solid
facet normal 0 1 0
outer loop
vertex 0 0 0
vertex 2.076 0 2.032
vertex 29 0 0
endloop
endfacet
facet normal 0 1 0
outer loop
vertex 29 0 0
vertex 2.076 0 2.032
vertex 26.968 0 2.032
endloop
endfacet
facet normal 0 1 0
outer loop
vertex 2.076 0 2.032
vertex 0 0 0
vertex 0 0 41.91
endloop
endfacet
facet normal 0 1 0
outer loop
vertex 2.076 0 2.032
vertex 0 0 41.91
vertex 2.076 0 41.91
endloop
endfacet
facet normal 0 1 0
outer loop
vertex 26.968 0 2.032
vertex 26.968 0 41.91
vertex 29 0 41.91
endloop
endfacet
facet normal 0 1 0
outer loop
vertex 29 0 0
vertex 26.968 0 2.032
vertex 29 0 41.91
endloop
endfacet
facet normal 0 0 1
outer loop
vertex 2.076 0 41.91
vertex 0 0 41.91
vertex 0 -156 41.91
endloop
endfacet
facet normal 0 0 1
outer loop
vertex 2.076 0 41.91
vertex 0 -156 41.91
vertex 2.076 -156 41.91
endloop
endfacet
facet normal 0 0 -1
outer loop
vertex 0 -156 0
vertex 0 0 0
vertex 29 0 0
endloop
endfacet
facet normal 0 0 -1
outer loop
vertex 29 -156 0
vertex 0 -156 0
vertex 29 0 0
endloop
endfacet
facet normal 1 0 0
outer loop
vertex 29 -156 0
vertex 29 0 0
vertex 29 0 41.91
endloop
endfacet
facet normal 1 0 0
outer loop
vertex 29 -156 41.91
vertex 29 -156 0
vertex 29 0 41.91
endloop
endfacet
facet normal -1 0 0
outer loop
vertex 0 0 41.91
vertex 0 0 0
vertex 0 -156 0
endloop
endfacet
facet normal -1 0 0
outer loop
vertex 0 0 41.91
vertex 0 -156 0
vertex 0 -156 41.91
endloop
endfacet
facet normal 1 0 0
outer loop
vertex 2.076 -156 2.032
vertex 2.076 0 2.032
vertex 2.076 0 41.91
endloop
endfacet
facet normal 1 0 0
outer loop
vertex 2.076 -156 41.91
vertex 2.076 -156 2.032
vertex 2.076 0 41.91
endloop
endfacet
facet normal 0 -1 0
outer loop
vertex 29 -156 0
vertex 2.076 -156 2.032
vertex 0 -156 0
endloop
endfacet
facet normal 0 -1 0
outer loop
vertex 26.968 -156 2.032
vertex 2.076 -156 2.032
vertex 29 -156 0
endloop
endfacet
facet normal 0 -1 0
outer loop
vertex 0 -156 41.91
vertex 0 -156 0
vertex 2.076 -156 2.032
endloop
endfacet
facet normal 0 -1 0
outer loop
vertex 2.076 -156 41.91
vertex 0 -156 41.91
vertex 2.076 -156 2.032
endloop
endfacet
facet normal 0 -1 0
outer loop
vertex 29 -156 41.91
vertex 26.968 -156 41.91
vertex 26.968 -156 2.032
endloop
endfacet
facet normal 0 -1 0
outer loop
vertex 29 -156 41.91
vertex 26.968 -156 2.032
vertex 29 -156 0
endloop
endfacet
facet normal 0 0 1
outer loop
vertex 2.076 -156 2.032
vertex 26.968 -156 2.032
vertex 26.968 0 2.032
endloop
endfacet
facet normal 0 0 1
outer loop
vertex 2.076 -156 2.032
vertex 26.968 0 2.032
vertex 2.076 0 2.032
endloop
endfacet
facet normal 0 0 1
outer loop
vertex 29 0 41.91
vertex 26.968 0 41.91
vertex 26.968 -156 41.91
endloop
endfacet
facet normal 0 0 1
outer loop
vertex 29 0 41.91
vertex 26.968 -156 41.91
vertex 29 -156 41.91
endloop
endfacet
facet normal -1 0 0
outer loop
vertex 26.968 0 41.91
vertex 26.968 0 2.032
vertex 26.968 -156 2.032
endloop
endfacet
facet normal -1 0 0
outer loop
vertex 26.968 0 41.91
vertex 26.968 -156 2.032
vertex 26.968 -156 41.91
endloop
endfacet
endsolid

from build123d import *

# Parameters (mm, degrees)
F0_W     = 28.999942
F0_H     = 41.91
F1_DEPTH = 155.999942
F2_W     = 24.892
F2_H     = 39.878
F3_DEPTH = 156.000942


with BuildPart() as f1:
    # F0 (on Front) → F1 (new body)
    with BuildSketch(Plane.XZ):
        with Locations((14.499971, 20.955)):
            Rectangle(F0_W, F0_H)
    extrude(amount=F1_DEPTH)

    # F2 (on face) → F3 (cut, through all)
    with BuildSketch(Plane(origin=(0, 0, 0), x_dir=(-1, 0, 0), z_dir=(0, 1, 0))):
        with Locations((-14.521942, 21.971)):
            Rectangle(F2_W, F2_H)
    extrude(amount=-F3_DEPTH, mode=Mode.SUBTRACT)


solid = f1.part
